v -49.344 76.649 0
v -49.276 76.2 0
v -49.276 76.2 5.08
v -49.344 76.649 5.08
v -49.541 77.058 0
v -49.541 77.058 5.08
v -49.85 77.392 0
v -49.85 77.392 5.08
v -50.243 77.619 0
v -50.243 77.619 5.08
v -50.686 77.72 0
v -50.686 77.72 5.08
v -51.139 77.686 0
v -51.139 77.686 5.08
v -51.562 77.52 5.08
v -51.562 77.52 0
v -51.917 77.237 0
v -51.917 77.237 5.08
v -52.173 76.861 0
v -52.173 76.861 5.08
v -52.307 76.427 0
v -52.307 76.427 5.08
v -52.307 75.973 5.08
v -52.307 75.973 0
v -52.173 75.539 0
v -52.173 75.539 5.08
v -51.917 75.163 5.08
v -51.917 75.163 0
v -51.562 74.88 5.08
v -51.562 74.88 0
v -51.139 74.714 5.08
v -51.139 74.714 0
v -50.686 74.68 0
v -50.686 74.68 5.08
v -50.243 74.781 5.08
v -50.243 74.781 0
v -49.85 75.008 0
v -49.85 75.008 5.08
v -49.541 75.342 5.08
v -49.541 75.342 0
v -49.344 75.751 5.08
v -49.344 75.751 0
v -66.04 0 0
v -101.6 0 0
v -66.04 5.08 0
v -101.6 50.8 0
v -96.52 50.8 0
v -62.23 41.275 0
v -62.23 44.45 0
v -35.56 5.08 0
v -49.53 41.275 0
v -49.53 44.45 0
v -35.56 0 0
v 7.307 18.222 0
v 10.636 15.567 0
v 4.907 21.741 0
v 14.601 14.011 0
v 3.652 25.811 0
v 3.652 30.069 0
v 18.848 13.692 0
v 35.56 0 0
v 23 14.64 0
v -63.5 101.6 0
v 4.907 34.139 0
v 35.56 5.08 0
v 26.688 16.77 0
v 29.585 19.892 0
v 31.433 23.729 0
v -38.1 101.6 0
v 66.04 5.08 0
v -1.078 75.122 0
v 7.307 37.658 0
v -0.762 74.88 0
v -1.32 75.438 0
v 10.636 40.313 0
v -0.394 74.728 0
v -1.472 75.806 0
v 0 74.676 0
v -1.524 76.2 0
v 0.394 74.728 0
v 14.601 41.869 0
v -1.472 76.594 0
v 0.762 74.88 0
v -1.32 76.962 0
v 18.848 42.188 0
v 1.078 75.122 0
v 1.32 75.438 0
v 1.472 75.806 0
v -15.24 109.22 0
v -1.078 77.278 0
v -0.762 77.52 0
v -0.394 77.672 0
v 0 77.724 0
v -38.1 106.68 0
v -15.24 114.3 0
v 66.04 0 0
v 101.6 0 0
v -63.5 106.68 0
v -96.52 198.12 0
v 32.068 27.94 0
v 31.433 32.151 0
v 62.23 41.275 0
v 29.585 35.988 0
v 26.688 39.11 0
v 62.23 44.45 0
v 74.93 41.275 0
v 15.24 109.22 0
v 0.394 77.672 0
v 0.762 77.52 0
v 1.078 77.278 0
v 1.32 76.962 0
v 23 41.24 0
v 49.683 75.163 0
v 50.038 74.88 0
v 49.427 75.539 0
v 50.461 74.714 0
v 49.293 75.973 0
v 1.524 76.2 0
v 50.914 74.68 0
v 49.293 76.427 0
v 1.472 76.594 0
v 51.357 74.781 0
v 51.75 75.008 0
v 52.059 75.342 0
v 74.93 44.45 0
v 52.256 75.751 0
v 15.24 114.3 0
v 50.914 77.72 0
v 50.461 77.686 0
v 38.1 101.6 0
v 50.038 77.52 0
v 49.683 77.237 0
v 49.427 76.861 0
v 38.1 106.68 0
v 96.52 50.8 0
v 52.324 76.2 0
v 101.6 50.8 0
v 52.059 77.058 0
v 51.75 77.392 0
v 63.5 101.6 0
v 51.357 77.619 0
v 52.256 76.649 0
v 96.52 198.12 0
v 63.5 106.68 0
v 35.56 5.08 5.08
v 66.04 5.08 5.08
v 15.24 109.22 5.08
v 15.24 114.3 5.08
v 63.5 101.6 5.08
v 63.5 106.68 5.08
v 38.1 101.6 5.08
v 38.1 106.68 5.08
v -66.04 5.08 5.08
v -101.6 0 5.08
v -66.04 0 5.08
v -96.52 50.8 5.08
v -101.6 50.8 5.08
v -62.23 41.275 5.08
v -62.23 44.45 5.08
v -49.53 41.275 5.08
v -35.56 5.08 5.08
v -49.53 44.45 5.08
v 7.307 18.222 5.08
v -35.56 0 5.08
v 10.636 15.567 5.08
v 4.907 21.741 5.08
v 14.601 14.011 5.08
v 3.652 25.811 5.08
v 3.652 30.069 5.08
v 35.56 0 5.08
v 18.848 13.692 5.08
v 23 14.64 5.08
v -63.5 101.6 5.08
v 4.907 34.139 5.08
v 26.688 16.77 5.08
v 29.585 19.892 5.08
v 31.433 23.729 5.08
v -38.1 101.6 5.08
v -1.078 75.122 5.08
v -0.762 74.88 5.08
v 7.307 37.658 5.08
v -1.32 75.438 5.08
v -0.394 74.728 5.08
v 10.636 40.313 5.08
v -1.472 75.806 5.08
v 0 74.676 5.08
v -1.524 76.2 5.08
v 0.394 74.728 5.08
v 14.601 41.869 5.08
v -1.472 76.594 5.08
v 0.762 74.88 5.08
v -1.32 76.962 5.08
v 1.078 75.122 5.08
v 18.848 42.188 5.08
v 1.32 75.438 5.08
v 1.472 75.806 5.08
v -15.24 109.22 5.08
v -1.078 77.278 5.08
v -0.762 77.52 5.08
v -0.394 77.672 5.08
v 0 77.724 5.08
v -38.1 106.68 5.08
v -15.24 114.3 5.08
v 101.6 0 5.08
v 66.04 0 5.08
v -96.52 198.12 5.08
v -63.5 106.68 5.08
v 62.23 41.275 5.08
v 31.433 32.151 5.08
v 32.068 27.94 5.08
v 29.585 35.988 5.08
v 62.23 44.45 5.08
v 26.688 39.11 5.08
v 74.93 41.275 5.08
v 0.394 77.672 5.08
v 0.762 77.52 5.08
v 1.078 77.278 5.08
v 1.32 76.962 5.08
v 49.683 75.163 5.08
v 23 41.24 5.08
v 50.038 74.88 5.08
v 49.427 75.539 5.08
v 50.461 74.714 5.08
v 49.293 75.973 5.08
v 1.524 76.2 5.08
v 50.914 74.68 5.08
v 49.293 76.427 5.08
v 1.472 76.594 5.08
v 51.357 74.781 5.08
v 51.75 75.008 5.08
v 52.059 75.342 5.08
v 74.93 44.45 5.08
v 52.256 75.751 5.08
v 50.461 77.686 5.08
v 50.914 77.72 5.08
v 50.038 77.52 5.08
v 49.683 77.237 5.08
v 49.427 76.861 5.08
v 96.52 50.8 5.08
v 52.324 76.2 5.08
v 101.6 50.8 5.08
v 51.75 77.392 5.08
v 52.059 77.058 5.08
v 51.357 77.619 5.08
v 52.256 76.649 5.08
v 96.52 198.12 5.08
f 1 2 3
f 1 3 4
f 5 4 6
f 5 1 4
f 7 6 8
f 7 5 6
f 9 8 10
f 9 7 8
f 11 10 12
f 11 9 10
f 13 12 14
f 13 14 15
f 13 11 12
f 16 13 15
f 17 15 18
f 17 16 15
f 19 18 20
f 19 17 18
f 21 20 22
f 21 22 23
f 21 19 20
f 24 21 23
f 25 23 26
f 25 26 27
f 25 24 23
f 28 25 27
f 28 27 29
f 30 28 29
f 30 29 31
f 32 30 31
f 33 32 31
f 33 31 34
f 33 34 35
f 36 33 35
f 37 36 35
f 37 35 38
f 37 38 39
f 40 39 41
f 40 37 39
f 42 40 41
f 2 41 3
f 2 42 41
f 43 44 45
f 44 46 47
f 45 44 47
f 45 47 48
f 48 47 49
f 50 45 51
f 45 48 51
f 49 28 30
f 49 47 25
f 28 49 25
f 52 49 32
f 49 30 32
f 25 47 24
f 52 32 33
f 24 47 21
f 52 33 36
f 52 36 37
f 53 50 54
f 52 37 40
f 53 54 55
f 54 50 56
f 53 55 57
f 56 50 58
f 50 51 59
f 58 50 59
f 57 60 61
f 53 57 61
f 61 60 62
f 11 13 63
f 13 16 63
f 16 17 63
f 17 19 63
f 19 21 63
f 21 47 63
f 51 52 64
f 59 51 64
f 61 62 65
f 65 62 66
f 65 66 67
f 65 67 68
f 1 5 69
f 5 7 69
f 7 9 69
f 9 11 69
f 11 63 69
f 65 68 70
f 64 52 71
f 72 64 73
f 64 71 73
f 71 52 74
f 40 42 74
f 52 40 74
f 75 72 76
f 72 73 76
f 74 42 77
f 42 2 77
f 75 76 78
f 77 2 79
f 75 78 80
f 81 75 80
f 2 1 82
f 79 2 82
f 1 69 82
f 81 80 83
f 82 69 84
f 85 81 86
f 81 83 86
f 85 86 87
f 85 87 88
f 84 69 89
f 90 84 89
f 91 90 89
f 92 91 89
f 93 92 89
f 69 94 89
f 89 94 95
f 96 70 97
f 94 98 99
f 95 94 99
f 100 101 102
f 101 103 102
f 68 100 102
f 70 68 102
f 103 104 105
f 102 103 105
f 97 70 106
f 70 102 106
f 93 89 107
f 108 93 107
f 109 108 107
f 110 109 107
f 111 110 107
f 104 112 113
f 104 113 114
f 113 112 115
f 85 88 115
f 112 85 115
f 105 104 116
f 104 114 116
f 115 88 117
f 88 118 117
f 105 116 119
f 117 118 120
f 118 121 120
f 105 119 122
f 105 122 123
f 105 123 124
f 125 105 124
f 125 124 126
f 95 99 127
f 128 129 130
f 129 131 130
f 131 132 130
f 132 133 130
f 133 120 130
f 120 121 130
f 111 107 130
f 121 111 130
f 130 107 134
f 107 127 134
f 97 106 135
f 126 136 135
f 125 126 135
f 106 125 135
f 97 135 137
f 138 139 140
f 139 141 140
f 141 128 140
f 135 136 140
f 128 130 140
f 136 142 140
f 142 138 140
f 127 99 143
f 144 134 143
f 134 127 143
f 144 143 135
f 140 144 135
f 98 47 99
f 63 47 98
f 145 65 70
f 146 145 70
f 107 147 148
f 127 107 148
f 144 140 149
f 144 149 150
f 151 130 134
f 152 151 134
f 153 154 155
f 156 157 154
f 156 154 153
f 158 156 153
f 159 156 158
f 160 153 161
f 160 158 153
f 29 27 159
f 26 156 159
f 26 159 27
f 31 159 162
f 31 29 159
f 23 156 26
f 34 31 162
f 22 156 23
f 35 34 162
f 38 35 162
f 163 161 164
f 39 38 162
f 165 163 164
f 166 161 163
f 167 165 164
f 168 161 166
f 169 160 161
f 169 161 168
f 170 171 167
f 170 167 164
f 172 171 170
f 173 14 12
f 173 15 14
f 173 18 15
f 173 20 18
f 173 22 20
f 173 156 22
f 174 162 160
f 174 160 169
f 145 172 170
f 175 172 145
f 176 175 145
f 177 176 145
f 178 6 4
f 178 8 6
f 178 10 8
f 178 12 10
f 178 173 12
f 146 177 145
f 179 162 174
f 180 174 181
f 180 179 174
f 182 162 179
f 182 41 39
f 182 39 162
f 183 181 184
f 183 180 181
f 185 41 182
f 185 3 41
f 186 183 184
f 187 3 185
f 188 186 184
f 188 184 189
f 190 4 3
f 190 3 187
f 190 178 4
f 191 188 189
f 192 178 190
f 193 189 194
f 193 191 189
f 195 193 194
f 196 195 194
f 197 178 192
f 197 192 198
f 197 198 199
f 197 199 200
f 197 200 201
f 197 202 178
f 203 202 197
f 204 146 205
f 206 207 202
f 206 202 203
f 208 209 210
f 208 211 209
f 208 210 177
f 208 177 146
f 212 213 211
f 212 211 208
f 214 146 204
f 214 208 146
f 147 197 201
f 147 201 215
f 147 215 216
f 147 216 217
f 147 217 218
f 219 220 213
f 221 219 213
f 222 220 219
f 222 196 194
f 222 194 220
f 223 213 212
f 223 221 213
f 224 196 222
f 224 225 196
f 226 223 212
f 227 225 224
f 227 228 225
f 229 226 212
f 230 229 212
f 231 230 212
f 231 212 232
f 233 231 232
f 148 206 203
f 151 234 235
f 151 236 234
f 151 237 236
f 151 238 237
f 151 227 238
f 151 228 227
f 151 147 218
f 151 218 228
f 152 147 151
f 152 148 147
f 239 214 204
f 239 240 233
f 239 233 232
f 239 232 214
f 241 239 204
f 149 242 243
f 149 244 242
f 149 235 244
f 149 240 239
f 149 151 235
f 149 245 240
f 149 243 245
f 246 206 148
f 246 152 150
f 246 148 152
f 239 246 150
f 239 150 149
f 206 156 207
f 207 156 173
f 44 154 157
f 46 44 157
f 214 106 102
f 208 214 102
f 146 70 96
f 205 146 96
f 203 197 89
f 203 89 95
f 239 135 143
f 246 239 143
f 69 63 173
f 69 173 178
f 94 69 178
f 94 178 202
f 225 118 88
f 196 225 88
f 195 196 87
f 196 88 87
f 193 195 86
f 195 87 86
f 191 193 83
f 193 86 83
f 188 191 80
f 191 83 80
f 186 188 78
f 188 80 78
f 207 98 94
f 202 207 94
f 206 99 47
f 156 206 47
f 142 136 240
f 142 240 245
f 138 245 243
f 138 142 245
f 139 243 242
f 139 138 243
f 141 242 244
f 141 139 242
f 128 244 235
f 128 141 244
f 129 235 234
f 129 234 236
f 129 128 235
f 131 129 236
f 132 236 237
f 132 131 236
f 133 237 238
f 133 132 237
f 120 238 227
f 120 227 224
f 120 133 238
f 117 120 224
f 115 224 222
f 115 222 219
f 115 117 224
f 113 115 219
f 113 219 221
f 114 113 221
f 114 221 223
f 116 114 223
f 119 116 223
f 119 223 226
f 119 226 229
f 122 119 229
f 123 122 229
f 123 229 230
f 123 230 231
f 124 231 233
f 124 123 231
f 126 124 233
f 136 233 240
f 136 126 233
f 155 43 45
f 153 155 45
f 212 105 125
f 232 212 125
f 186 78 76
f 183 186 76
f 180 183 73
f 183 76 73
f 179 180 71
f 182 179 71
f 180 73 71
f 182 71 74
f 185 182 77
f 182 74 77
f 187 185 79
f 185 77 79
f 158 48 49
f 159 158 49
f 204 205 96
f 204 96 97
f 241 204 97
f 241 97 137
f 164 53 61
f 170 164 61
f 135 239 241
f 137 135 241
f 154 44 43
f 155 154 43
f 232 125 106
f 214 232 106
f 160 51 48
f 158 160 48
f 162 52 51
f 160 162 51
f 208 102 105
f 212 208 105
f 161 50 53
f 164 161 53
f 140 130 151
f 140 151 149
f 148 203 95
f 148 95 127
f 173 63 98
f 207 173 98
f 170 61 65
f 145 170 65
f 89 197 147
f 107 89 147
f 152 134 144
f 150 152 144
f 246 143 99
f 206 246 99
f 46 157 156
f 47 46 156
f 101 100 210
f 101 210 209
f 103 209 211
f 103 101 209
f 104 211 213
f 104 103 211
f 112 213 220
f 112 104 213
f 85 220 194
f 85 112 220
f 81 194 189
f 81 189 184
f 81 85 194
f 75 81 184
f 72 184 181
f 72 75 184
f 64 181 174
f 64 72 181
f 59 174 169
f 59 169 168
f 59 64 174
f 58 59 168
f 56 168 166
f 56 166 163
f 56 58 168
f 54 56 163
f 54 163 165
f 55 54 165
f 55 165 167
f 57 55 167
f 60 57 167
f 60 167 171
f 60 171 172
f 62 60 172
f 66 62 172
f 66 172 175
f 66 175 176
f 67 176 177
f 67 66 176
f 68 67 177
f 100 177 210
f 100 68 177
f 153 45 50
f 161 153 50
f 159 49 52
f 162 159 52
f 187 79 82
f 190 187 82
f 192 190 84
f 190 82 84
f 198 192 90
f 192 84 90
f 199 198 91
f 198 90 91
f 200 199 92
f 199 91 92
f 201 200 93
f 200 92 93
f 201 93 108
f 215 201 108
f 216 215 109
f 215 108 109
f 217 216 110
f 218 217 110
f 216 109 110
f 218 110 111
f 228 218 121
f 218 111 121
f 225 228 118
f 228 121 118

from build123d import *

# Parameters (mm, degrees)
SKETCH1_R           = 14.2875
SKETCH1_R_2         = 1.524
SKETCH1_W           = 25.4
SKETCH1_H           = 5.08
BOSS_EXTRUDE1_DEPTH = 5.08
SKETCH2_W           = 5.08
SKETCH2_H           = 50.8
BOSS_EXTRUDE2_DEPTH = 5.08
SKETCH3_W           = 30.48
SKETCH3_H           = 5.08
CUT_EXTRUDE1_DEPTH  = 5.08


with BuildPart() as part:
    # Sketch1 → Boss-Extrude1 (new body)
    with BuildSketch(Plane.XY):
        Polygon((96.52, 198.12), (-96.52, 198.12), (-96.52, 0), (-66.04, 0), (-66.04, 5.08), (-35.56, 5.08), (-35.56, 0), (35.56, 0), (35.56, 5.08), (66.04, 5.08), (66.04, 0), (96.52, 0), align=None)
        Polygon((-62.23, 44.45), (-55.88, 44.45), (-49.53, 44.45), (-49.53, 41.275), (-62.23, 41.275), align=None, mode=Mode.SUBTRACT)
        with Locations((17.78, 27.94)):
            Circle(SKETCH1_R, mode=Mode.SUBTRACT)
        Polygon((62.23, 44.45), (68.58, 44.45), (74.93, 44.45), (74.93, 41.275), (62.23, 41.275), align=None, mode=Mode.SUBTRACT)
        with Locations((-50.8, 76.2)):
            Circle(SKETCH1_R_2, mode=Mode.SUBTRACT)
        with BuildLine():
            ThreePointArc((0, 74.676), (-1.077630735, 75.122369265), (-1.524, 76.2))
            ThreePointArc((-1.524, 76.2), (-1.077630735, 77.277630735), (0, 77.724))
            ThreePointArc((0, 77.724), (1.077630735, 77.277630735), (1.524, 76.2))
            ThreePointArc((1.524, 76.2), (1.077630735, 75.122369265), (0, 74.676))
        make_face(mode=Mode.SUBTRACT)
        with Locations((-50.8, 104.14)):
            Rectangle(SKETCH1_W, SKETCH1_H, mode=Mode.SUBTRACT)
        with Locations((50.8, 76.2)):
            Circle(SKETCH1_R_2, mode=Mode.SUBTRACT)
        with Locations((50.8, 104.14)):
            Rectangle(SKETCH1_W, SKETCH1_H, mode=Mode.SUBTRACT)
    extrude(amount=BOSS_EXTRUDE1_DEPTH)

    # Sketch2 → Boss-Extrude2 (add)
    with BuildSketch(Plane.XY.offset(5.08)):
        with Locations((99.06, 25.4)):
            Rectangle(SKETCH2_W, SKETCH2_H)
        with Locations((-99.06, 25.4)):
            Rectangle(SKETCH2_W, SKETCH2_H)
    extrude(amount=-BOSS_EXTRUDE2_DEPTH)

    # Sketch3 → Cut-Extrude1 (cut)
    with BuildSketch(Plane.XY.offset(5.08)):
        with Locations((0, 111.76)):
            Rectangle(SKETCH3_W, SKETCH3_H)
    extrude(amount=-CUT_EXTRUDE1_DEPTH, mode=Mode.SUBTRACT)


solid = part.part
